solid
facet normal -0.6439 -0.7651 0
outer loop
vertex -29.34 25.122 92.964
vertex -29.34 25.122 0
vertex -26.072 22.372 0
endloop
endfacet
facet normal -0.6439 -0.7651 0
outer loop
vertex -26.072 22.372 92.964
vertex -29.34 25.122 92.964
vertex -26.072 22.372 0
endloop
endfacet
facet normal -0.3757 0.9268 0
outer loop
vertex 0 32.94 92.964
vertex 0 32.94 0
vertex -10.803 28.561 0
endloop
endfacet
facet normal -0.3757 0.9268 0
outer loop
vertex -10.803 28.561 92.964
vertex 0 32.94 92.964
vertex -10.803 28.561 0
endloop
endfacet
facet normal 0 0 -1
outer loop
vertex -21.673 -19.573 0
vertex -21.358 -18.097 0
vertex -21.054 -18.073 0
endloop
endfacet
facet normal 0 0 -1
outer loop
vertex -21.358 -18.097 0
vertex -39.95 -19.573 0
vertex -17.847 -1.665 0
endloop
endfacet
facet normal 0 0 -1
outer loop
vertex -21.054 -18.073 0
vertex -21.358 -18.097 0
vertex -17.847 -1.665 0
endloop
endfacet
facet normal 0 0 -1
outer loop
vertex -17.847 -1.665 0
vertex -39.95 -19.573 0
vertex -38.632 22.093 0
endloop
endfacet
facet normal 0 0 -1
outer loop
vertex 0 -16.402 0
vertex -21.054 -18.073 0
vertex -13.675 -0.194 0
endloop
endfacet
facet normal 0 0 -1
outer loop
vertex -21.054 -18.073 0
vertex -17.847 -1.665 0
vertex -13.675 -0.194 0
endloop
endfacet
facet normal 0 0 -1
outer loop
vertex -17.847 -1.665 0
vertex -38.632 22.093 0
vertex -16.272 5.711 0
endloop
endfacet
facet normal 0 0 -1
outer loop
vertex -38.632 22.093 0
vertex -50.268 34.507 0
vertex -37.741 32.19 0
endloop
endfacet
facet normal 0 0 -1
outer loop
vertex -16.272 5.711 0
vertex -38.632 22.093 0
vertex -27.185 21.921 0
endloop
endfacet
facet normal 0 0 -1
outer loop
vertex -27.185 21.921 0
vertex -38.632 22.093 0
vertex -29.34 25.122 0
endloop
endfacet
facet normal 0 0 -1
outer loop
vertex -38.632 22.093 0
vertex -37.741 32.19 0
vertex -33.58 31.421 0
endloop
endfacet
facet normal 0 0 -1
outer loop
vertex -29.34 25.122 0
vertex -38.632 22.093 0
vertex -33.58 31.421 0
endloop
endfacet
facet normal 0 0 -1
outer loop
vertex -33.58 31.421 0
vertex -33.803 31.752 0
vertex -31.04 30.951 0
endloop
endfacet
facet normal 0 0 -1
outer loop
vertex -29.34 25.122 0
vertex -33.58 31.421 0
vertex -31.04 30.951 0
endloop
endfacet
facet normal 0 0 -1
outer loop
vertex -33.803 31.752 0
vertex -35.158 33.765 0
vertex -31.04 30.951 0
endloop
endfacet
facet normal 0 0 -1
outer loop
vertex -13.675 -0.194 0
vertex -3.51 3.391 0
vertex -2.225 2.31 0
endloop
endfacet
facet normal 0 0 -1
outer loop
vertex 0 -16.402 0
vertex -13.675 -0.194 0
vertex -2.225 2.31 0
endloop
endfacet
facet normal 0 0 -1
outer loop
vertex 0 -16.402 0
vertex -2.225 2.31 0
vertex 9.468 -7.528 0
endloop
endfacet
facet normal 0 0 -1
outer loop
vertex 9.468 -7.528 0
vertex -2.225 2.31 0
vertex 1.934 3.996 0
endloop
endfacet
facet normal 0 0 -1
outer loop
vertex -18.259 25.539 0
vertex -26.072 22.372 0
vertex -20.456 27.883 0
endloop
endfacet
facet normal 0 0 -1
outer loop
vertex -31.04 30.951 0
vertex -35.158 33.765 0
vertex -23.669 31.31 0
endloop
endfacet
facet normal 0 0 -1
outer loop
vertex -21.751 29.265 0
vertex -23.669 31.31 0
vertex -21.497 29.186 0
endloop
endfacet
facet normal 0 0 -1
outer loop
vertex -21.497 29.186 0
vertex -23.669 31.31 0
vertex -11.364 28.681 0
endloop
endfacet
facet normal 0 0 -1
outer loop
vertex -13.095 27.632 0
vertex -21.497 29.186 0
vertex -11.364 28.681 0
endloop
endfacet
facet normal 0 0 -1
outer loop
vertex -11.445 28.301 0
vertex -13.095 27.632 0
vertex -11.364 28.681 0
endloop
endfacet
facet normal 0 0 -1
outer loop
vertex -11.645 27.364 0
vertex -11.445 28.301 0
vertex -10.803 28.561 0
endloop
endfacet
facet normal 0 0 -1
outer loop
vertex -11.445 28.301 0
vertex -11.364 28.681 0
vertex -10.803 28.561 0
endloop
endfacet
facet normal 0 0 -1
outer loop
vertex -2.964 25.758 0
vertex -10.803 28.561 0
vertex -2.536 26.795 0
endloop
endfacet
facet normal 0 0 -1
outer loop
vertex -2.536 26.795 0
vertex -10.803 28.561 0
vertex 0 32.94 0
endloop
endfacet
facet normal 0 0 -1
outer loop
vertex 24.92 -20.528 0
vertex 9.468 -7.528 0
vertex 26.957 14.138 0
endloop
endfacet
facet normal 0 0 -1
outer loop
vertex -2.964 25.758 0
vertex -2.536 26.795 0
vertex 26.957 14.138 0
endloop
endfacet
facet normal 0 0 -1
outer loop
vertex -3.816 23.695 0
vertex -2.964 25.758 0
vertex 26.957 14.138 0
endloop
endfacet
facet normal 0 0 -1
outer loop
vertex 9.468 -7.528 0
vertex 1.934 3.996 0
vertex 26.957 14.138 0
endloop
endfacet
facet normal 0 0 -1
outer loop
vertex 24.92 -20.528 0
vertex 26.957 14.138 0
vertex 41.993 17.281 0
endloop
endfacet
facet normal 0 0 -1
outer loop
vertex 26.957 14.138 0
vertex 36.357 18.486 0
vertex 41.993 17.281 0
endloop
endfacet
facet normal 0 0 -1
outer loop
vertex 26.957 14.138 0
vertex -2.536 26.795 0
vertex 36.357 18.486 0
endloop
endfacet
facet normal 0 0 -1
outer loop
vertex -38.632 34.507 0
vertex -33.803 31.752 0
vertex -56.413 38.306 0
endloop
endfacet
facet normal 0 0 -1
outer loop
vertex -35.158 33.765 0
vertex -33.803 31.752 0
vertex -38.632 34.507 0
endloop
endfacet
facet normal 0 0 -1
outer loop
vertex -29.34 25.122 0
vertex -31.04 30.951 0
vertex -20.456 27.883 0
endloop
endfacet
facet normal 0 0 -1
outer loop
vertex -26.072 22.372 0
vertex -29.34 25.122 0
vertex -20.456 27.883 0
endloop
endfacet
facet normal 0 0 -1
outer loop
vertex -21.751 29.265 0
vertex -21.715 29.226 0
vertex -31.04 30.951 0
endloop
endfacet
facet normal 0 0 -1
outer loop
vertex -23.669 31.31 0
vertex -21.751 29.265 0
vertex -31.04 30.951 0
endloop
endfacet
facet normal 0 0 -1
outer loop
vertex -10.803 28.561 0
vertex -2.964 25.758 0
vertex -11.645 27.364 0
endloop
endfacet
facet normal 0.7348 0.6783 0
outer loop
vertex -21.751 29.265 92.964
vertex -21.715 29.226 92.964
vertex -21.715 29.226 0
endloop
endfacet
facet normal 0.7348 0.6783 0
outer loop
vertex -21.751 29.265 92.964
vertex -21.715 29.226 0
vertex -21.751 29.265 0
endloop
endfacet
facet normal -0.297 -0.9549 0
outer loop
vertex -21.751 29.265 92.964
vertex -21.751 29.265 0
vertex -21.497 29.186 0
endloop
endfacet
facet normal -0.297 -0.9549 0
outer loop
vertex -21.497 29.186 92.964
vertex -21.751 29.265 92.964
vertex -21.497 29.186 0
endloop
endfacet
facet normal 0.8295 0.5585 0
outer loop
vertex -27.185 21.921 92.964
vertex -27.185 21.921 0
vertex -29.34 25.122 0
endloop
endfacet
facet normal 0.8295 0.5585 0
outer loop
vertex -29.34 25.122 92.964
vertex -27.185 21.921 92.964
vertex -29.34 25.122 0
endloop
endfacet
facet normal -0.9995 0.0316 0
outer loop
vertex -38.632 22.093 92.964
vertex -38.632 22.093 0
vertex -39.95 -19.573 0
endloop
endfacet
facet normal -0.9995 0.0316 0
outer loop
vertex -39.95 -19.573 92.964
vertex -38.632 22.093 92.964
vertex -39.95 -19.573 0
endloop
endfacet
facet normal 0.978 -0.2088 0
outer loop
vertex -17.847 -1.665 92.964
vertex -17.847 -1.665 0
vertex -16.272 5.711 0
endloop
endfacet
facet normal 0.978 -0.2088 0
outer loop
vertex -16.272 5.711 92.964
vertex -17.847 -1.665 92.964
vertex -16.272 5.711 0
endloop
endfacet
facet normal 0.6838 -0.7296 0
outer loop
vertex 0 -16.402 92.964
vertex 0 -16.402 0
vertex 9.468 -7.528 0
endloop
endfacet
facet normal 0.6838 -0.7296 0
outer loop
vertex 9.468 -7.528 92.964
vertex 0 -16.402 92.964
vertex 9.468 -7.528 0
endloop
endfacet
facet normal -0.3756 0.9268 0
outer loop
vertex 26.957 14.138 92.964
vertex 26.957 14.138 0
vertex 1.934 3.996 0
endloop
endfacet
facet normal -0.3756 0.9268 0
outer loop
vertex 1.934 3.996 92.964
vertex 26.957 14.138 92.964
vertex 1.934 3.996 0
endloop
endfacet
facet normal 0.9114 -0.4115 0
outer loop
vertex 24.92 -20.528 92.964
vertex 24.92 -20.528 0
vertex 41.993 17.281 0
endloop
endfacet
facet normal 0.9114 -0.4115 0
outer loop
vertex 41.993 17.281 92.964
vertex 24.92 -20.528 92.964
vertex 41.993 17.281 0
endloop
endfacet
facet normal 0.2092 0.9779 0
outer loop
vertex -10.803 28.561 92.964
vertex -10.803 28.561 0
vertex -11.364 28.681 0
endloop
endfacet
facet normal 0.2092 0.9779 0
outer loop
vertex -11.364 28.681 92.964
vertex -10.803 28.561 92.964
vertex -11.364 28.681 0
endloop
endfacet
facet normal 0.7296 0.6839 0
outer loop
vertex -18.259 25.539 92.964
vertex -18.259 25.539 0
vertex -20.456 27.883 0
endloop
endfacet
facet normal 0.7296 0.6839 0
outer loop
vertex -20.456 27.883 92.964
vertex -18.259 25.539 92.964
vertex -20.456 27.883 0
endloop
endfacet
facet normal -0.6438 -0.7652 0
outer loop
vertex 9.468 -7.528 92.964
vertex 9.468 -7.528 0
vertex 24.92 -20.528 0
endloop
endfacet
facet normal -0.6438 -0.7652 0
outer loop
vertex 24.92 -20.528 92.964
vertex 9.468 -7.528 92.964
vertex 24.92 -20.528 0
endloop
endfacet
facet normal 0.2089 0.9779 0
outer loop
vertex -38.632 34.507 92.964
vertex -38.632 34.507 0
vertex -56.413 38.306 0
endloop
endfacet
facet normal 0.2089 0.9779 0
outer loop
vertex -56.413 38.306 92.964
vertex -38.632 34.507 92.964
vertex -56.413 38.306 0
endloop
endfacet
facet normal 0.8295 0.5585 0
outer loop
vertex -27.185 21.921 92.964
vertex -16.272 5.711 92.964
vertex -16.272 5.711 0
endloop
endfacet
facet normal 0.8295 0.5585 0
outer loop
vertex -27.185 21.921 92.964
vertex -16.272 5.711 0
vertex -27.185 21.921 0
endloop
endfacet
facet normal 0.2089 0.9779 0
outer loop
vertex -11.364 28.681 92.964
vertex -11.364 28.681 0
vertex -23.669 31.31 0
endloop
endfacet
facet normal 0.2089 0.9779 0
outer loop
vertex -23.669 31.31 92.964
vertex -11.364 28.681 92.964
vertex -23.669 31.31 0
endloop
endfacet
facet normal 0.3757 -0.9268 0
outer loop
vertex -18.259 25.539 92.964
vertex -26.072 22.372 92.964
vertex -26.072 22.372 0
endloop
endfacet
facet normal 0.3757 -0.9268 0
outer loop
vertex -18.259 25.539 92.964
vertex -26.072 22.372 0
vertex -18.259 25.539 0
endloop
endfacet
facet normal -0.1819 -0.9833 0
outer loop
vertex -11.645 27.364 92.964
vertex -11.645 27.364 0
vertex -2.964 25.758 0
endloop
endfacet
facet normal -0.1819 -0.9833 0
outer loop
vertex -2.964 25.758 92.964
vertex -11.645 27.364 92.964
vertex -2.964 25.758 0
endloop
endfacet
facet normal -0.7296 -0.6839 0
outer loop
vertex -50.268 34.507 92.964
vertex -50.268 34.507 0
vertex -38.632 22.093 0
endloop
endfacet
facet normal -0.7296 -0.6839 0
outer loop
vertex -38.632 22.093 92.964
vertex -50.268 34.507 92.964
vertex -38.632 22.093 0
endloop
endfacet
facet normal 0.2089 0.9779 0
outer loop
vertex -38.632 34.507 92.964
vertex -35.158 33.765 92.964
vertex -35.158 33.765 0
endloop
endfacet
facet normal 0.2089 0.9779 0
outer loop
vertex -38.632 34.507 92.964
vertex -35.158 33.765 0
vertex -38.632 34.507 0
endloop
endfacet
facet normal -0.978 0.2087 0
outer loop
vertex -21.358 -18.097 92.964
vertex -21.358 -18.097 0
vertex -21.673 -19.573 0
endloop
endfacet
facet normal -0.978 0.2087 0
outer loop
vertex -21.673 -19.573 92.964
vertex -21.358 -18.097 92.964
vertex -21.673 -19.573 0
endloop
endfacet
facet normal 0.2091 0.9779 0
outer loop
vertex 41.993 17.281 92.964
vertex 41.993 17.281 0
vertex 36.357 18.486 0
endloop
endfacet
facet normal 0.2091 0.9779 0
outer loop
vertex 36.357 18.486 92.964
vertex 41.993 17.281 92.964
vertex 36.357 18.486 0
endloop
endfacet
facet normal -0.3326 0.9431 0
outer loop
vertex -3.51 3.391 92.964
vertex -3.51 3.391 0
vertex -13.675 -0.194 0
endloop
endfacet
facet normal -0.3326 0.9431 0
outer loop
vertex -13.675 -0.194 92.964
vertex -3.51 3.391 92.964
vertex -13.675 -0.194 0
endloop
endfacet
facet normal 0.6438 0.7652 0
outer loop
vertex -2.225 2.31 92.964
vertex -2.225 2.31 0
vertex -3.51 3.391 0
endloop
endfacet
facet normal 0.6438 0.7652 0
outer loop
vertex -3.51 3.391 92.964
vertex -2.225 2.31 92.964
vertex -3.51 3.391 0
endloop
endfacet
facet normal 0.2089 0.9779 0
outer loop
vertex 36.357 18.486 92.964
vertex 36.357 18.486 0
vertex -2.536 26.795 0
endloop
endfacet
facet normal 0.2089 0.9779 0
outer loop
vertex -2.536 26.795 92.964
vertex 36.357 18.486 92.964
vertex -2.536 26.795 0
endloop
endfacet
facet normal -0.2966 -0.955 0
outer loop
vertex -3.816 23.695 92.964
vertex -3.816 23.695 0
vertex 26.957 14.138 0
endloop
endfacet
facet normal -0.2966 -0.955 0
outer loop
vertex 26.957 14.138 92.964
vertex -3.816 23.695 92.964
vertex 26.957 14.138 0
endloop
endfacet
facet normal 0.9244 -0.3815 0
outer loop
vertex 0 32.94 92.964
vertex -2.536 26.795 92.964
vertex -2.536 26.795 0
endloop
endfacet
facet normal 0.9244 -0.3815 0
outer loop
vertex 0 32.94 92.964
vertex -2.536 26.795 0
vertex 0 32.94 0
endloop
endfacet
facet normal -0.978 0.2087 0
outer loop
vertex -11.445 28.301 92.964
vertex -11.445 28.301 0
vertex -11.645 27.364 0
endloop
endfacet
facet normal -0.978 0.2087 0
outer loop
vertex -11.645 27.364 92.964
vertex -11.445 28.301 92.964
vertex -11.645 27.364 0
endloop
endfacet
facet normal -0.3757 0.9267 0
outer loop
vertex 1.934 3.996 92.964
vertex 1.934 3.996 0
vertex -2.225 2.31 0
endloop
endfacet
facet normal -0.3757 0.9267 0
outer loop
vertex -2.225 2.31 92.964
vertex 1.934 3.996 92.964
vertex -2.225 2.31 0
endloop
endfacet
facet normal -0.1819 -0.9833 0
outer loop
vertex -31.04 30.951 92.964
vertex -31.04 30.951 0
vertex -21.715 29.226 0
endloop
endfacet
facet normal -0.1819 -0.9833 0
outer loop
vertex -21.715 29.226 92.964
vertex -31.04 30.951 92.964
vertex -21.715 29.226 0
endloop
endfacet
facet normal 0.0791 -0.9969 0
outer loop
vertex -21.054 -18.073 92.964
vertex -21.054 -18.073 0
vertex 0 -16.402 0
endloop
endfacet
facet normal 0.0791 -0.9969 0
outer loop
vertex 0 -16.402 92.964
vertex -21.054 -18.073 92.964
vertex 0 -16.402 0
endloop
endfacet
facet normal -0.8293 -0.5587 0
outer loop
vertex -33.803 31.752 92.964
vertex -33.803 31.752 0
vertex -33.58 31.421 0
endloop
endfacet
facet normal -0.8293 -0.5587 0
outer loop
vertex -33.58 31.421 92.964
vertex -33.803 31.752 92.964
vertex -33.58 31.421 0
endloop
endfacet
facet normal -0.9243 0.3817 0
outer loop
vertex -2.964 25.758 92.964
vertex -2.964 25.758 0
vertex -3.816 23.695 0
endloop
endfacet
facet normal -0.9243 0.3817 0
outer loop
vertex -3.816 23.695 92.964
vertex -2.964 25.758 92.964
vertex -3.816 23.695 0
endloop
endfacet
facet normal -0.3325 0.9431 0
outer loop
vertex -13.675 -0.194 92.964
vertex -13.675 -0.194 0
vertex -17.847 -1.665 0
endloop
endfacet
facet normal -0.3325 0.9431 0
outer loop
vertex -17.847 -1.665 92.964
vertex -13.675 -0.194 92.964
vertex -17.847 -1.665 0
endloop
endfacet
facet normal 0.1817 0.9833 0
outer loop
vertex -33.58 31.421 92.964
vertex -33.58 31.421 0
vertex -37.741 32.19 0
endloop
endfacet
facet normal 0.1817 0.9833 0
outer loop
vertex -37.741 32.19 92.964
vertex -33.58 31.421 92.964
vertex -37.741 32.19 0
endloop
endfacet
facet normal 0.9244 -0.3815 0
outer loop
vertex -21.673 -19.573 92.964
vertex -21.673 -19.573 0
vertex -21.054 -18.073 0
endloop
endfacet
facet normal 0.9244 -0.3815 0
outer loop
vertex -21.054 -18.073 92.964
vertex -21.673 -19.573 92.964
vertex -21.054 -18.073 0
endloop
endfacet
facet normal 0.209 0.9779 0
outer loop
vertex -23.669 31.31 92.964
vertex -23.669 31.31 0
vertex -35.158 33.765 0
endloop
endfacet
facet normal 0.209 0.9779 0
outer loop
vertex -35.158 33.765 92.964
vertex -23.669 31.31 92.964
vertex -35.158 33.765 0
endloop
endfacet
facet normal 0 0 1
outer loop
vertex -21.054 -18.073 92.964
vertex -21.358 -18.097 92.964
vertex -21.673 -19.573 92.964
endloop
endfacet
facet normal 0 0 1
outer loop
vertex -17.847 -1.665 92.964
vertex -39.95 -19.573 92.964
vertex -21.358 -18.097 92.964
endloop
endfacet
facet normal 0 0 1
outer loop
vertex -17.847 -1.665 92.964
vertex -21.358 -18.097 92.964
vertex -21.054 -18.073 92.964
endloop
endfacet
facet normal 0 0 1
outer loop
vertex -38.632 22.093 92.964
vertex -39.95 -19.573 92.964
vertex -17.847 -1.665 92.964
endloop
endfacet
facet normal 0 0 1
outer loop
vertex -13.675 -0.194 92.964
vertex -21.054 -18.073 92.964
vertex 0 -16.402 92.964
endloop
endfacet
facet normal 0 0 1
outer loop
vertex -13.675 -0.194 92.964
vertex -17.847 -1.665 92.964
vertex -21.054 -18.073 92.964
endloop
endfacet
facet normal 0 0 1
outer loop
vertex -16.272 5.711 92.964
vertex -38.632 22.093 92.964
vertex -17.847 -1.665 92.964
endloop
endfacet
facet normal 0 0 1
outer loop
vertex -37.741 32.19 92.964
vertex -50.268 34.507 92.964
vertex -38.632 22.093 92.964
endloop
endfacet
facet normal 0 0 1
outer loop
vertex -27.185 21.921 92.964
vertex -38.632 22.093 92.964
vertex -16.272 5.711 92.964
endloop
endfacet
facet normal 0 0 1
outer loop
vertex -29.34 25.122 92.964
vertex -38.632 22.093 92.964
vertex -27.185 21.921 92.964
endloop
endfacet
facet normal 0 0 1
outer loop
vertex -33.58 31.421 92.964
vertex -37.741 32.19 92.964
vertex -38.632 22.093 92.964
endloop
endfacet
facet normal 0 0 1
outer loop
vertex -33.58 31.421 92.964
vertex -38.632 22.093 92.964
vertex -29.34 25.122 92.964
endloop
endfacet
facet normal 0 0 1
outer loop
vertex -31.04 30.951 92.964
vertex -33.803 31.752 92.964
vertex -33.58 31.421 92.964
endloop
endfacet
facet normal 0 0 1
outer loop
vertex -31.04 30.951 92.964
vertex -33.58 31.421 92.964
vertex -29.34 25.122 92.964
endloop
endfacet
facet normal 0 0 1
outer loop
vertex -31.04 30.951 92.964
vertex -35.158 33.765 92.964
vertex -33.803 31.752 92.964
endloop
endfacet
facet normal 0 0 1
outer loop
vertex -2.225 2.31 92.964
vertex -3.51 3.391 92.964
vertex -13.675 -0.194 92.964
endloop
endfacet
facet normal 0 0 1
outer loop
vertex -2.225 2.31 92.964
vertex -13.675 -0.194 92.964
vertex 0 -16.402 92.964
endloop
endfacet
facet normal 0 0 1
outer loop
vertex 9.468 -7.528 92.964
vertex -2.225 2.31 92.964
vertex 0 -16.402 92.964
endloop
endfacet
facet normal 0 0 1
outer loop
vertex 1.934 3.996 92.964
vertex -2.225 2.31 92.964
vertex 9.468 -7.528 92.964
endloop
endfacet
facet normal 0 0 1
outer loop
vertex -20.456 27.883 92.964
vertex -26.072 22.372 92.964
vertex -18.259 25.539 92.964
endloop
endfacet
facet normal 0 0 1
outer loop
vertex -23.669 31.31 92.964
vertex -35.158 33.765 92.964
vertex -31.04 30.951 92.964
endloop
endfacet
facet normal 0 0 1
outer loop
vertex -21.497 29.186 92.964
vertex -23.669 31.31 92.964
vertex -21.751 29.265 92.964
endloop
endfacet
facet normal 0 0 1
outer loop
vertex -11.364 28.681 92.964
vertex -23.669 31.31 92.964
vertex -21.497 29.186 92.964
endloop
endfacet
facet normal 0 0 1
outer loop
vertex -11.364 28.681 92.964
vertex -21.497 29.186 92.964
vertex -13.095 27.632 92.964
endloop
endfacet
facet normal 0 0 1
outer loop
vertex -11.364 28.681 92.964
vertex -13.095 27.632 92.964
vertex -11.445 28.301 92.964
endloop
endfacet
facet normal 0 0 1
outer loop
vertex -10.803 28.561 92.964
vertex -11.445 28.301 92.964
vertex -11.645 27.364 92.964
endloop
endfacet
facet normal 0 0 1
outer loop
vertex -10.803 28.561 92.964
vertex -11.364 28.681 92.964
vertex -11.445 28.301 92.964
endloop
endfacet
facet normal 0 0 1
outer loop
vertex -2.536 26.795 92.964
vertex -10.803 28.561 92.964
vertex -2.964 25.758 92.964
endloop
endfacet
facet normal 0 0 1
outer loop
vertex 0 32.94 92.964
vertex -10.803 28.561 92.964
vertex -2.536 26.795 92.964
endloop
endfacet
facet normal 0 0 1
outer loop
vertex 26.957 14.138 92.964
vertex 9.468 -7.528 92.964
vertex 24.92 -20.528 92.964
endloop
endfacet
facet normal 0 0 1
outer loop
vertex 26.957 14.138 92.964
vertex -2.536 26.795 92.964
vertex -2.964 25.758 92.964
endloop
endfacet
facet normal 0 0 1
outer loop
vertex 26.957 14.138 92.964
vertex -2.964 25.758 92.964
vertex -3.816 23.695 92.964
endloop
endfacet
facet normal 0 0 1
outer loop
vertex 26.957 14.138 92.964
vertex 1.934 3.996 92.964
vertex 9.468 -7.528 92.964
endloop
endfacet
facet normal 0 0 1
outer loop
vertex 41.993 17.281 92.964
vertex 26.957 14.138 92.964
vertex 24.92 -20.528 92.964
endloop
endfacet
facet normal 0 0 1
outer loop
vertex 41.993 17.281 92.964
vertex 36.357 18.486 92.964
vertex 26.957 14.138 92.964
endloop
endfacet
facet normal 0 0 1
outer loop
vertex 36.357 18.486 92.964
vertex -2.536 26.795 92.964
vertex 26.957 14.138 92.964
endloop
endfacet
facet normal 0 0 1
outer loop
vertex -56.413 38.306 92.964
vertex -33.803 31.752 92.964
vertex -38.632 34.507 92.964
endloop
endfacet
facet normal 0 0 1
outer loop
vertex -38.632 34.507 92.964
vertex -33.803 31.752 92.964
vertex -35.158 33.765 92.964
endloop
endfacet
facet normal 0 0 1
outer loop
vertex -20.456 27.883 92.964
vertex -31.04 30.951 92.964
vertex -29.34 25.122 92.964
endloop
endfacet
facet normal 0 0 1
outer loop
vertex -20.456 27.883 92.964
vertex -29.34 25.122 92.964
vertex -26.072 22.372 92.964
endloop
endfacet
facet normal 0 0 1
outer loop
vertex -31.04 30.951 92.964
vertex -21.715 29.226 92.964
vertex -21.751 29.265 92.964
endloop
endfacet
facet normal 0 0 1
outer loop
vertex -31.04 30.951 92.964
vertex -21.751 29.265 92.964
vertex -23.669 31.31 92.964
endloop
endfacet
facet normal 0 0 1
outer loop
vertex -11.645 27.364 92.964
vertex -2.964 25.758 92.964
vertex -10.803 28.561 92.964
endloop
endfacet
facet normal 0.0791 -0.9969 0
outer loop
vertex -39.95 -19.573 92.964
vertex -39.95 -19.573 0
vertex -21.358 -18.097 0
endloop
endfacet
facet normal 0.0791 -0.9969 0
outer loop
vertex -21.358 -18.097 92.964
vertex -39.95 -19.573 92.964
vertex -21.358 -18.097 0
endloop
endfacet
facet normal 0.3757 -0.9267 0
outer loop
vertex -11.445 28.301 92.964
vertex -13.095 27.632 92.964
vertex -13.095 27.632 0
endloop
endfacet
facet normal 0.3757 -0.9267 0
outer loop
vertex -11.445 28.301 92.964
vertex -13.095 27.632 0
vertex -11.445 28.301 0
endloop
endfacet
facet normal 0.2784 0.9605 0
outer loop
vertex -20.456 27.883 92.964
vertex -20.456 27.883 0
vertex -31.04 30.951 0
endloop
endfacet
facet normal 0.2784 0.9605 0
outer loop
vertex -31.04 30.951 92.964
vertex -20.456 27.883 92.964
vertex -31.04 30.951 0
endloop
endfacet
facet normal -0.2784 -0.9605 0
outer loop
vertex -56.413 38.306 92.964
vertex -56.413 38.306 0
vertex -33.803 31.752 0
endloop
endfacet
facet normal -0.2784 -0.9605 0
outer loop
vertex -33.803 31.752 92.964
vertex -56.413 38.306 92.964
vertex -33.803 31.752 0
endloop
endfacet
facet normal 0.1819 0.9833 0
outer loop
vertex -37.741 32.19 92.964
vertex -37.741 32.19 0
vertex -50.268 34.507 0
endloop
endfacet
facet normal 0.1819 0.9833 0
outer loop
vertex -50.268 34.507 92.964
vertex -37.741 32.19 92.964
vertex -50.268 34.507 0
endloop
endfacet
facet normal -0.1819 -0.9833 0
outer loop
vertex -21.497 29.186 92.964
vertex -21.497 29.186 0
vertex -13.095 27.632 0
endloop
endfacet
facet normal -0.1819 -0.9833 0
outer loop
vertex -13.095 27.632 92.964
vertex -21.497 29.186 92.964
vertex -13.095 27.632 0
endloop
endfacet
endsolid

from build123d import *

# Parameters (mm, degrees)
F1_DEPTH = 92.964


with BuildPart() as f1:
    # F0 (on Top) → F1 (new body)
    with BuildSketch(Plane.XY):
        Polygon((-11.363891304, 28.6811531914), (-23.6685577262, 31.310043601), (-21.7514889919, 29.2647632039), (-21.4971445771, 29.1857769379), (-13.0953979351, 27.631865636), (-11.445167611, 28.3007349582), align=None)
        Polygon((-21.7514889919, 29.2647632039), (-23.6685577262, 31.310043601), (-35.158415116, 33.764850165), (-34.8719179356, 33.3392921913), align=None)
        Polygon((-21.7152671967, 29.2261189308), (-21.7514889919, 29.2647632039), (-34.8719179356, 33.3392921913), (-33.8031092464, 31.7517021871), (-31.0401167534, 30.9507590243), align=None)
        Polygon((-34.8719179356, 33.3392921913), (-35.158415116, 33.764850165), (-38.6320129037, 34.5069838887), align=None)
        Polygon((-10.8025132343, 28.5612148385), (-11.363891304, 28.6811531914), (-11.445167611, 28.3007349582), align=None)
        Polygon((-33.8031092464, 31.7517021871), (-34.8719179356, 33.3392921913), (-38.6320129037, 34.5069838887), (-56.4126817215, 38.3058215108), align=None)
        Polygon((-10.8025132343, 28.5612148385), (-11.445167611, 28.3007349582), (-11.6453689931, 27.3636813576), (-2.9640479419, 25.7580624939), (-2.536040841, 26.7950840673), align=None)
        Polygon((0, 32.9396761954), (-10.8025132343, 28.5612148385), (-2.536040841, 26.7950840673), align=None)
        Polygon((-18.2591771562, 25.5388890032), (-20.4559686533, 27.8825997451), (-31.0401167534, 30.9507590243), (-33.5801640761, 31.4205432739), (-29.339740332, 25.1218909351), (-26.0716256546, 22.3723570017), align=None)
        Polygon((-33.5801640761, 31.4205432739), (-31.0401167534, 30.9507590243), (-33.8031092464, 31.7517021871), align=None)
        Polygon((36.3568202391, 18.4856292647), (-2.536040841, 26.7950840673), (-2.9640479419, 25.7580624939), align=None)
        Polygon((-29.339740332, 25.1218909351), (-33.5801640761, 31.4205432739), (-37.7410697113, 32.190106862), align=None)
        Polygon((36.3568202391, 18.4856292647), (-2.9640479419, 25.7580624939), (-3.815611044, 23.6948039497), (26.957339273, 14.1383116556), (1.9335445611, 3.9956980087), (11.2069335345, -5.8978860567), (31.1385840178, 12.7843171358), align=None)
        Polygon((41.9932989192, 17.2813963145), (36.3568202391, 18.4856292647), (31.1385840178, 12.7843171358), (11.2069335345, -5.8978860567), (24.9195843935, -20.5276254565), align=None)
        Polygon((-27.1848988191, 21.921126494), (-29.339740332, 25.1218909351), (-37.7410697113, 32.190106862), (-50.2680484108, 34.5069838887), (-38.6320129037, 22.0927418237), (-39.6262408451, -9.3448986648), (-17.8473095251, -1.6648430482), (-16.271543508, 5.7106166242), align=None)
        Polygon((9.4679610689, -7.5278482606), (24.9195843935, -20.5276254565), (11.2069335345, -5.8978860567), align=None)
        Polygon((9.4679610689, -7.5278482606), (11.2069335345, -5.8978860567), (1.9335445611, 3.9956980087), (-2.2253809367, 2.3100074492), align=None)
        Polygon((0, -16.4022950937), (9.4679610689, -7.5278482606), (-2.2253809367, 2.3100074492), (-3.5101987058, 3.3909517865), (-13.6749758769, -0.1935240933), (-21.0544278002, -18.0732527887), align=None)
        Polygon((-21.0544278002, -18.0732527887), (-13.6749758769, -0.1935240933), (-17.8473095251, -1.6648430482), (-21.3581134797, -18.0973544137), align=None)
        Polygon((-21.3581134797, -18.0973544137), (-17.8473095251, -1.6648430482), (-39.6262408451, -9.3448986648), (-39.9497039616, -19.5728521794), align=None)
        Polygon((-21.6733533889, -19.5728521794), (-21.0544278002, -18.0732527887), (-21.3581134797, -18.0973544137), align=None)
    extrude(amount=F1_DEPTH)


solid = f1.part
